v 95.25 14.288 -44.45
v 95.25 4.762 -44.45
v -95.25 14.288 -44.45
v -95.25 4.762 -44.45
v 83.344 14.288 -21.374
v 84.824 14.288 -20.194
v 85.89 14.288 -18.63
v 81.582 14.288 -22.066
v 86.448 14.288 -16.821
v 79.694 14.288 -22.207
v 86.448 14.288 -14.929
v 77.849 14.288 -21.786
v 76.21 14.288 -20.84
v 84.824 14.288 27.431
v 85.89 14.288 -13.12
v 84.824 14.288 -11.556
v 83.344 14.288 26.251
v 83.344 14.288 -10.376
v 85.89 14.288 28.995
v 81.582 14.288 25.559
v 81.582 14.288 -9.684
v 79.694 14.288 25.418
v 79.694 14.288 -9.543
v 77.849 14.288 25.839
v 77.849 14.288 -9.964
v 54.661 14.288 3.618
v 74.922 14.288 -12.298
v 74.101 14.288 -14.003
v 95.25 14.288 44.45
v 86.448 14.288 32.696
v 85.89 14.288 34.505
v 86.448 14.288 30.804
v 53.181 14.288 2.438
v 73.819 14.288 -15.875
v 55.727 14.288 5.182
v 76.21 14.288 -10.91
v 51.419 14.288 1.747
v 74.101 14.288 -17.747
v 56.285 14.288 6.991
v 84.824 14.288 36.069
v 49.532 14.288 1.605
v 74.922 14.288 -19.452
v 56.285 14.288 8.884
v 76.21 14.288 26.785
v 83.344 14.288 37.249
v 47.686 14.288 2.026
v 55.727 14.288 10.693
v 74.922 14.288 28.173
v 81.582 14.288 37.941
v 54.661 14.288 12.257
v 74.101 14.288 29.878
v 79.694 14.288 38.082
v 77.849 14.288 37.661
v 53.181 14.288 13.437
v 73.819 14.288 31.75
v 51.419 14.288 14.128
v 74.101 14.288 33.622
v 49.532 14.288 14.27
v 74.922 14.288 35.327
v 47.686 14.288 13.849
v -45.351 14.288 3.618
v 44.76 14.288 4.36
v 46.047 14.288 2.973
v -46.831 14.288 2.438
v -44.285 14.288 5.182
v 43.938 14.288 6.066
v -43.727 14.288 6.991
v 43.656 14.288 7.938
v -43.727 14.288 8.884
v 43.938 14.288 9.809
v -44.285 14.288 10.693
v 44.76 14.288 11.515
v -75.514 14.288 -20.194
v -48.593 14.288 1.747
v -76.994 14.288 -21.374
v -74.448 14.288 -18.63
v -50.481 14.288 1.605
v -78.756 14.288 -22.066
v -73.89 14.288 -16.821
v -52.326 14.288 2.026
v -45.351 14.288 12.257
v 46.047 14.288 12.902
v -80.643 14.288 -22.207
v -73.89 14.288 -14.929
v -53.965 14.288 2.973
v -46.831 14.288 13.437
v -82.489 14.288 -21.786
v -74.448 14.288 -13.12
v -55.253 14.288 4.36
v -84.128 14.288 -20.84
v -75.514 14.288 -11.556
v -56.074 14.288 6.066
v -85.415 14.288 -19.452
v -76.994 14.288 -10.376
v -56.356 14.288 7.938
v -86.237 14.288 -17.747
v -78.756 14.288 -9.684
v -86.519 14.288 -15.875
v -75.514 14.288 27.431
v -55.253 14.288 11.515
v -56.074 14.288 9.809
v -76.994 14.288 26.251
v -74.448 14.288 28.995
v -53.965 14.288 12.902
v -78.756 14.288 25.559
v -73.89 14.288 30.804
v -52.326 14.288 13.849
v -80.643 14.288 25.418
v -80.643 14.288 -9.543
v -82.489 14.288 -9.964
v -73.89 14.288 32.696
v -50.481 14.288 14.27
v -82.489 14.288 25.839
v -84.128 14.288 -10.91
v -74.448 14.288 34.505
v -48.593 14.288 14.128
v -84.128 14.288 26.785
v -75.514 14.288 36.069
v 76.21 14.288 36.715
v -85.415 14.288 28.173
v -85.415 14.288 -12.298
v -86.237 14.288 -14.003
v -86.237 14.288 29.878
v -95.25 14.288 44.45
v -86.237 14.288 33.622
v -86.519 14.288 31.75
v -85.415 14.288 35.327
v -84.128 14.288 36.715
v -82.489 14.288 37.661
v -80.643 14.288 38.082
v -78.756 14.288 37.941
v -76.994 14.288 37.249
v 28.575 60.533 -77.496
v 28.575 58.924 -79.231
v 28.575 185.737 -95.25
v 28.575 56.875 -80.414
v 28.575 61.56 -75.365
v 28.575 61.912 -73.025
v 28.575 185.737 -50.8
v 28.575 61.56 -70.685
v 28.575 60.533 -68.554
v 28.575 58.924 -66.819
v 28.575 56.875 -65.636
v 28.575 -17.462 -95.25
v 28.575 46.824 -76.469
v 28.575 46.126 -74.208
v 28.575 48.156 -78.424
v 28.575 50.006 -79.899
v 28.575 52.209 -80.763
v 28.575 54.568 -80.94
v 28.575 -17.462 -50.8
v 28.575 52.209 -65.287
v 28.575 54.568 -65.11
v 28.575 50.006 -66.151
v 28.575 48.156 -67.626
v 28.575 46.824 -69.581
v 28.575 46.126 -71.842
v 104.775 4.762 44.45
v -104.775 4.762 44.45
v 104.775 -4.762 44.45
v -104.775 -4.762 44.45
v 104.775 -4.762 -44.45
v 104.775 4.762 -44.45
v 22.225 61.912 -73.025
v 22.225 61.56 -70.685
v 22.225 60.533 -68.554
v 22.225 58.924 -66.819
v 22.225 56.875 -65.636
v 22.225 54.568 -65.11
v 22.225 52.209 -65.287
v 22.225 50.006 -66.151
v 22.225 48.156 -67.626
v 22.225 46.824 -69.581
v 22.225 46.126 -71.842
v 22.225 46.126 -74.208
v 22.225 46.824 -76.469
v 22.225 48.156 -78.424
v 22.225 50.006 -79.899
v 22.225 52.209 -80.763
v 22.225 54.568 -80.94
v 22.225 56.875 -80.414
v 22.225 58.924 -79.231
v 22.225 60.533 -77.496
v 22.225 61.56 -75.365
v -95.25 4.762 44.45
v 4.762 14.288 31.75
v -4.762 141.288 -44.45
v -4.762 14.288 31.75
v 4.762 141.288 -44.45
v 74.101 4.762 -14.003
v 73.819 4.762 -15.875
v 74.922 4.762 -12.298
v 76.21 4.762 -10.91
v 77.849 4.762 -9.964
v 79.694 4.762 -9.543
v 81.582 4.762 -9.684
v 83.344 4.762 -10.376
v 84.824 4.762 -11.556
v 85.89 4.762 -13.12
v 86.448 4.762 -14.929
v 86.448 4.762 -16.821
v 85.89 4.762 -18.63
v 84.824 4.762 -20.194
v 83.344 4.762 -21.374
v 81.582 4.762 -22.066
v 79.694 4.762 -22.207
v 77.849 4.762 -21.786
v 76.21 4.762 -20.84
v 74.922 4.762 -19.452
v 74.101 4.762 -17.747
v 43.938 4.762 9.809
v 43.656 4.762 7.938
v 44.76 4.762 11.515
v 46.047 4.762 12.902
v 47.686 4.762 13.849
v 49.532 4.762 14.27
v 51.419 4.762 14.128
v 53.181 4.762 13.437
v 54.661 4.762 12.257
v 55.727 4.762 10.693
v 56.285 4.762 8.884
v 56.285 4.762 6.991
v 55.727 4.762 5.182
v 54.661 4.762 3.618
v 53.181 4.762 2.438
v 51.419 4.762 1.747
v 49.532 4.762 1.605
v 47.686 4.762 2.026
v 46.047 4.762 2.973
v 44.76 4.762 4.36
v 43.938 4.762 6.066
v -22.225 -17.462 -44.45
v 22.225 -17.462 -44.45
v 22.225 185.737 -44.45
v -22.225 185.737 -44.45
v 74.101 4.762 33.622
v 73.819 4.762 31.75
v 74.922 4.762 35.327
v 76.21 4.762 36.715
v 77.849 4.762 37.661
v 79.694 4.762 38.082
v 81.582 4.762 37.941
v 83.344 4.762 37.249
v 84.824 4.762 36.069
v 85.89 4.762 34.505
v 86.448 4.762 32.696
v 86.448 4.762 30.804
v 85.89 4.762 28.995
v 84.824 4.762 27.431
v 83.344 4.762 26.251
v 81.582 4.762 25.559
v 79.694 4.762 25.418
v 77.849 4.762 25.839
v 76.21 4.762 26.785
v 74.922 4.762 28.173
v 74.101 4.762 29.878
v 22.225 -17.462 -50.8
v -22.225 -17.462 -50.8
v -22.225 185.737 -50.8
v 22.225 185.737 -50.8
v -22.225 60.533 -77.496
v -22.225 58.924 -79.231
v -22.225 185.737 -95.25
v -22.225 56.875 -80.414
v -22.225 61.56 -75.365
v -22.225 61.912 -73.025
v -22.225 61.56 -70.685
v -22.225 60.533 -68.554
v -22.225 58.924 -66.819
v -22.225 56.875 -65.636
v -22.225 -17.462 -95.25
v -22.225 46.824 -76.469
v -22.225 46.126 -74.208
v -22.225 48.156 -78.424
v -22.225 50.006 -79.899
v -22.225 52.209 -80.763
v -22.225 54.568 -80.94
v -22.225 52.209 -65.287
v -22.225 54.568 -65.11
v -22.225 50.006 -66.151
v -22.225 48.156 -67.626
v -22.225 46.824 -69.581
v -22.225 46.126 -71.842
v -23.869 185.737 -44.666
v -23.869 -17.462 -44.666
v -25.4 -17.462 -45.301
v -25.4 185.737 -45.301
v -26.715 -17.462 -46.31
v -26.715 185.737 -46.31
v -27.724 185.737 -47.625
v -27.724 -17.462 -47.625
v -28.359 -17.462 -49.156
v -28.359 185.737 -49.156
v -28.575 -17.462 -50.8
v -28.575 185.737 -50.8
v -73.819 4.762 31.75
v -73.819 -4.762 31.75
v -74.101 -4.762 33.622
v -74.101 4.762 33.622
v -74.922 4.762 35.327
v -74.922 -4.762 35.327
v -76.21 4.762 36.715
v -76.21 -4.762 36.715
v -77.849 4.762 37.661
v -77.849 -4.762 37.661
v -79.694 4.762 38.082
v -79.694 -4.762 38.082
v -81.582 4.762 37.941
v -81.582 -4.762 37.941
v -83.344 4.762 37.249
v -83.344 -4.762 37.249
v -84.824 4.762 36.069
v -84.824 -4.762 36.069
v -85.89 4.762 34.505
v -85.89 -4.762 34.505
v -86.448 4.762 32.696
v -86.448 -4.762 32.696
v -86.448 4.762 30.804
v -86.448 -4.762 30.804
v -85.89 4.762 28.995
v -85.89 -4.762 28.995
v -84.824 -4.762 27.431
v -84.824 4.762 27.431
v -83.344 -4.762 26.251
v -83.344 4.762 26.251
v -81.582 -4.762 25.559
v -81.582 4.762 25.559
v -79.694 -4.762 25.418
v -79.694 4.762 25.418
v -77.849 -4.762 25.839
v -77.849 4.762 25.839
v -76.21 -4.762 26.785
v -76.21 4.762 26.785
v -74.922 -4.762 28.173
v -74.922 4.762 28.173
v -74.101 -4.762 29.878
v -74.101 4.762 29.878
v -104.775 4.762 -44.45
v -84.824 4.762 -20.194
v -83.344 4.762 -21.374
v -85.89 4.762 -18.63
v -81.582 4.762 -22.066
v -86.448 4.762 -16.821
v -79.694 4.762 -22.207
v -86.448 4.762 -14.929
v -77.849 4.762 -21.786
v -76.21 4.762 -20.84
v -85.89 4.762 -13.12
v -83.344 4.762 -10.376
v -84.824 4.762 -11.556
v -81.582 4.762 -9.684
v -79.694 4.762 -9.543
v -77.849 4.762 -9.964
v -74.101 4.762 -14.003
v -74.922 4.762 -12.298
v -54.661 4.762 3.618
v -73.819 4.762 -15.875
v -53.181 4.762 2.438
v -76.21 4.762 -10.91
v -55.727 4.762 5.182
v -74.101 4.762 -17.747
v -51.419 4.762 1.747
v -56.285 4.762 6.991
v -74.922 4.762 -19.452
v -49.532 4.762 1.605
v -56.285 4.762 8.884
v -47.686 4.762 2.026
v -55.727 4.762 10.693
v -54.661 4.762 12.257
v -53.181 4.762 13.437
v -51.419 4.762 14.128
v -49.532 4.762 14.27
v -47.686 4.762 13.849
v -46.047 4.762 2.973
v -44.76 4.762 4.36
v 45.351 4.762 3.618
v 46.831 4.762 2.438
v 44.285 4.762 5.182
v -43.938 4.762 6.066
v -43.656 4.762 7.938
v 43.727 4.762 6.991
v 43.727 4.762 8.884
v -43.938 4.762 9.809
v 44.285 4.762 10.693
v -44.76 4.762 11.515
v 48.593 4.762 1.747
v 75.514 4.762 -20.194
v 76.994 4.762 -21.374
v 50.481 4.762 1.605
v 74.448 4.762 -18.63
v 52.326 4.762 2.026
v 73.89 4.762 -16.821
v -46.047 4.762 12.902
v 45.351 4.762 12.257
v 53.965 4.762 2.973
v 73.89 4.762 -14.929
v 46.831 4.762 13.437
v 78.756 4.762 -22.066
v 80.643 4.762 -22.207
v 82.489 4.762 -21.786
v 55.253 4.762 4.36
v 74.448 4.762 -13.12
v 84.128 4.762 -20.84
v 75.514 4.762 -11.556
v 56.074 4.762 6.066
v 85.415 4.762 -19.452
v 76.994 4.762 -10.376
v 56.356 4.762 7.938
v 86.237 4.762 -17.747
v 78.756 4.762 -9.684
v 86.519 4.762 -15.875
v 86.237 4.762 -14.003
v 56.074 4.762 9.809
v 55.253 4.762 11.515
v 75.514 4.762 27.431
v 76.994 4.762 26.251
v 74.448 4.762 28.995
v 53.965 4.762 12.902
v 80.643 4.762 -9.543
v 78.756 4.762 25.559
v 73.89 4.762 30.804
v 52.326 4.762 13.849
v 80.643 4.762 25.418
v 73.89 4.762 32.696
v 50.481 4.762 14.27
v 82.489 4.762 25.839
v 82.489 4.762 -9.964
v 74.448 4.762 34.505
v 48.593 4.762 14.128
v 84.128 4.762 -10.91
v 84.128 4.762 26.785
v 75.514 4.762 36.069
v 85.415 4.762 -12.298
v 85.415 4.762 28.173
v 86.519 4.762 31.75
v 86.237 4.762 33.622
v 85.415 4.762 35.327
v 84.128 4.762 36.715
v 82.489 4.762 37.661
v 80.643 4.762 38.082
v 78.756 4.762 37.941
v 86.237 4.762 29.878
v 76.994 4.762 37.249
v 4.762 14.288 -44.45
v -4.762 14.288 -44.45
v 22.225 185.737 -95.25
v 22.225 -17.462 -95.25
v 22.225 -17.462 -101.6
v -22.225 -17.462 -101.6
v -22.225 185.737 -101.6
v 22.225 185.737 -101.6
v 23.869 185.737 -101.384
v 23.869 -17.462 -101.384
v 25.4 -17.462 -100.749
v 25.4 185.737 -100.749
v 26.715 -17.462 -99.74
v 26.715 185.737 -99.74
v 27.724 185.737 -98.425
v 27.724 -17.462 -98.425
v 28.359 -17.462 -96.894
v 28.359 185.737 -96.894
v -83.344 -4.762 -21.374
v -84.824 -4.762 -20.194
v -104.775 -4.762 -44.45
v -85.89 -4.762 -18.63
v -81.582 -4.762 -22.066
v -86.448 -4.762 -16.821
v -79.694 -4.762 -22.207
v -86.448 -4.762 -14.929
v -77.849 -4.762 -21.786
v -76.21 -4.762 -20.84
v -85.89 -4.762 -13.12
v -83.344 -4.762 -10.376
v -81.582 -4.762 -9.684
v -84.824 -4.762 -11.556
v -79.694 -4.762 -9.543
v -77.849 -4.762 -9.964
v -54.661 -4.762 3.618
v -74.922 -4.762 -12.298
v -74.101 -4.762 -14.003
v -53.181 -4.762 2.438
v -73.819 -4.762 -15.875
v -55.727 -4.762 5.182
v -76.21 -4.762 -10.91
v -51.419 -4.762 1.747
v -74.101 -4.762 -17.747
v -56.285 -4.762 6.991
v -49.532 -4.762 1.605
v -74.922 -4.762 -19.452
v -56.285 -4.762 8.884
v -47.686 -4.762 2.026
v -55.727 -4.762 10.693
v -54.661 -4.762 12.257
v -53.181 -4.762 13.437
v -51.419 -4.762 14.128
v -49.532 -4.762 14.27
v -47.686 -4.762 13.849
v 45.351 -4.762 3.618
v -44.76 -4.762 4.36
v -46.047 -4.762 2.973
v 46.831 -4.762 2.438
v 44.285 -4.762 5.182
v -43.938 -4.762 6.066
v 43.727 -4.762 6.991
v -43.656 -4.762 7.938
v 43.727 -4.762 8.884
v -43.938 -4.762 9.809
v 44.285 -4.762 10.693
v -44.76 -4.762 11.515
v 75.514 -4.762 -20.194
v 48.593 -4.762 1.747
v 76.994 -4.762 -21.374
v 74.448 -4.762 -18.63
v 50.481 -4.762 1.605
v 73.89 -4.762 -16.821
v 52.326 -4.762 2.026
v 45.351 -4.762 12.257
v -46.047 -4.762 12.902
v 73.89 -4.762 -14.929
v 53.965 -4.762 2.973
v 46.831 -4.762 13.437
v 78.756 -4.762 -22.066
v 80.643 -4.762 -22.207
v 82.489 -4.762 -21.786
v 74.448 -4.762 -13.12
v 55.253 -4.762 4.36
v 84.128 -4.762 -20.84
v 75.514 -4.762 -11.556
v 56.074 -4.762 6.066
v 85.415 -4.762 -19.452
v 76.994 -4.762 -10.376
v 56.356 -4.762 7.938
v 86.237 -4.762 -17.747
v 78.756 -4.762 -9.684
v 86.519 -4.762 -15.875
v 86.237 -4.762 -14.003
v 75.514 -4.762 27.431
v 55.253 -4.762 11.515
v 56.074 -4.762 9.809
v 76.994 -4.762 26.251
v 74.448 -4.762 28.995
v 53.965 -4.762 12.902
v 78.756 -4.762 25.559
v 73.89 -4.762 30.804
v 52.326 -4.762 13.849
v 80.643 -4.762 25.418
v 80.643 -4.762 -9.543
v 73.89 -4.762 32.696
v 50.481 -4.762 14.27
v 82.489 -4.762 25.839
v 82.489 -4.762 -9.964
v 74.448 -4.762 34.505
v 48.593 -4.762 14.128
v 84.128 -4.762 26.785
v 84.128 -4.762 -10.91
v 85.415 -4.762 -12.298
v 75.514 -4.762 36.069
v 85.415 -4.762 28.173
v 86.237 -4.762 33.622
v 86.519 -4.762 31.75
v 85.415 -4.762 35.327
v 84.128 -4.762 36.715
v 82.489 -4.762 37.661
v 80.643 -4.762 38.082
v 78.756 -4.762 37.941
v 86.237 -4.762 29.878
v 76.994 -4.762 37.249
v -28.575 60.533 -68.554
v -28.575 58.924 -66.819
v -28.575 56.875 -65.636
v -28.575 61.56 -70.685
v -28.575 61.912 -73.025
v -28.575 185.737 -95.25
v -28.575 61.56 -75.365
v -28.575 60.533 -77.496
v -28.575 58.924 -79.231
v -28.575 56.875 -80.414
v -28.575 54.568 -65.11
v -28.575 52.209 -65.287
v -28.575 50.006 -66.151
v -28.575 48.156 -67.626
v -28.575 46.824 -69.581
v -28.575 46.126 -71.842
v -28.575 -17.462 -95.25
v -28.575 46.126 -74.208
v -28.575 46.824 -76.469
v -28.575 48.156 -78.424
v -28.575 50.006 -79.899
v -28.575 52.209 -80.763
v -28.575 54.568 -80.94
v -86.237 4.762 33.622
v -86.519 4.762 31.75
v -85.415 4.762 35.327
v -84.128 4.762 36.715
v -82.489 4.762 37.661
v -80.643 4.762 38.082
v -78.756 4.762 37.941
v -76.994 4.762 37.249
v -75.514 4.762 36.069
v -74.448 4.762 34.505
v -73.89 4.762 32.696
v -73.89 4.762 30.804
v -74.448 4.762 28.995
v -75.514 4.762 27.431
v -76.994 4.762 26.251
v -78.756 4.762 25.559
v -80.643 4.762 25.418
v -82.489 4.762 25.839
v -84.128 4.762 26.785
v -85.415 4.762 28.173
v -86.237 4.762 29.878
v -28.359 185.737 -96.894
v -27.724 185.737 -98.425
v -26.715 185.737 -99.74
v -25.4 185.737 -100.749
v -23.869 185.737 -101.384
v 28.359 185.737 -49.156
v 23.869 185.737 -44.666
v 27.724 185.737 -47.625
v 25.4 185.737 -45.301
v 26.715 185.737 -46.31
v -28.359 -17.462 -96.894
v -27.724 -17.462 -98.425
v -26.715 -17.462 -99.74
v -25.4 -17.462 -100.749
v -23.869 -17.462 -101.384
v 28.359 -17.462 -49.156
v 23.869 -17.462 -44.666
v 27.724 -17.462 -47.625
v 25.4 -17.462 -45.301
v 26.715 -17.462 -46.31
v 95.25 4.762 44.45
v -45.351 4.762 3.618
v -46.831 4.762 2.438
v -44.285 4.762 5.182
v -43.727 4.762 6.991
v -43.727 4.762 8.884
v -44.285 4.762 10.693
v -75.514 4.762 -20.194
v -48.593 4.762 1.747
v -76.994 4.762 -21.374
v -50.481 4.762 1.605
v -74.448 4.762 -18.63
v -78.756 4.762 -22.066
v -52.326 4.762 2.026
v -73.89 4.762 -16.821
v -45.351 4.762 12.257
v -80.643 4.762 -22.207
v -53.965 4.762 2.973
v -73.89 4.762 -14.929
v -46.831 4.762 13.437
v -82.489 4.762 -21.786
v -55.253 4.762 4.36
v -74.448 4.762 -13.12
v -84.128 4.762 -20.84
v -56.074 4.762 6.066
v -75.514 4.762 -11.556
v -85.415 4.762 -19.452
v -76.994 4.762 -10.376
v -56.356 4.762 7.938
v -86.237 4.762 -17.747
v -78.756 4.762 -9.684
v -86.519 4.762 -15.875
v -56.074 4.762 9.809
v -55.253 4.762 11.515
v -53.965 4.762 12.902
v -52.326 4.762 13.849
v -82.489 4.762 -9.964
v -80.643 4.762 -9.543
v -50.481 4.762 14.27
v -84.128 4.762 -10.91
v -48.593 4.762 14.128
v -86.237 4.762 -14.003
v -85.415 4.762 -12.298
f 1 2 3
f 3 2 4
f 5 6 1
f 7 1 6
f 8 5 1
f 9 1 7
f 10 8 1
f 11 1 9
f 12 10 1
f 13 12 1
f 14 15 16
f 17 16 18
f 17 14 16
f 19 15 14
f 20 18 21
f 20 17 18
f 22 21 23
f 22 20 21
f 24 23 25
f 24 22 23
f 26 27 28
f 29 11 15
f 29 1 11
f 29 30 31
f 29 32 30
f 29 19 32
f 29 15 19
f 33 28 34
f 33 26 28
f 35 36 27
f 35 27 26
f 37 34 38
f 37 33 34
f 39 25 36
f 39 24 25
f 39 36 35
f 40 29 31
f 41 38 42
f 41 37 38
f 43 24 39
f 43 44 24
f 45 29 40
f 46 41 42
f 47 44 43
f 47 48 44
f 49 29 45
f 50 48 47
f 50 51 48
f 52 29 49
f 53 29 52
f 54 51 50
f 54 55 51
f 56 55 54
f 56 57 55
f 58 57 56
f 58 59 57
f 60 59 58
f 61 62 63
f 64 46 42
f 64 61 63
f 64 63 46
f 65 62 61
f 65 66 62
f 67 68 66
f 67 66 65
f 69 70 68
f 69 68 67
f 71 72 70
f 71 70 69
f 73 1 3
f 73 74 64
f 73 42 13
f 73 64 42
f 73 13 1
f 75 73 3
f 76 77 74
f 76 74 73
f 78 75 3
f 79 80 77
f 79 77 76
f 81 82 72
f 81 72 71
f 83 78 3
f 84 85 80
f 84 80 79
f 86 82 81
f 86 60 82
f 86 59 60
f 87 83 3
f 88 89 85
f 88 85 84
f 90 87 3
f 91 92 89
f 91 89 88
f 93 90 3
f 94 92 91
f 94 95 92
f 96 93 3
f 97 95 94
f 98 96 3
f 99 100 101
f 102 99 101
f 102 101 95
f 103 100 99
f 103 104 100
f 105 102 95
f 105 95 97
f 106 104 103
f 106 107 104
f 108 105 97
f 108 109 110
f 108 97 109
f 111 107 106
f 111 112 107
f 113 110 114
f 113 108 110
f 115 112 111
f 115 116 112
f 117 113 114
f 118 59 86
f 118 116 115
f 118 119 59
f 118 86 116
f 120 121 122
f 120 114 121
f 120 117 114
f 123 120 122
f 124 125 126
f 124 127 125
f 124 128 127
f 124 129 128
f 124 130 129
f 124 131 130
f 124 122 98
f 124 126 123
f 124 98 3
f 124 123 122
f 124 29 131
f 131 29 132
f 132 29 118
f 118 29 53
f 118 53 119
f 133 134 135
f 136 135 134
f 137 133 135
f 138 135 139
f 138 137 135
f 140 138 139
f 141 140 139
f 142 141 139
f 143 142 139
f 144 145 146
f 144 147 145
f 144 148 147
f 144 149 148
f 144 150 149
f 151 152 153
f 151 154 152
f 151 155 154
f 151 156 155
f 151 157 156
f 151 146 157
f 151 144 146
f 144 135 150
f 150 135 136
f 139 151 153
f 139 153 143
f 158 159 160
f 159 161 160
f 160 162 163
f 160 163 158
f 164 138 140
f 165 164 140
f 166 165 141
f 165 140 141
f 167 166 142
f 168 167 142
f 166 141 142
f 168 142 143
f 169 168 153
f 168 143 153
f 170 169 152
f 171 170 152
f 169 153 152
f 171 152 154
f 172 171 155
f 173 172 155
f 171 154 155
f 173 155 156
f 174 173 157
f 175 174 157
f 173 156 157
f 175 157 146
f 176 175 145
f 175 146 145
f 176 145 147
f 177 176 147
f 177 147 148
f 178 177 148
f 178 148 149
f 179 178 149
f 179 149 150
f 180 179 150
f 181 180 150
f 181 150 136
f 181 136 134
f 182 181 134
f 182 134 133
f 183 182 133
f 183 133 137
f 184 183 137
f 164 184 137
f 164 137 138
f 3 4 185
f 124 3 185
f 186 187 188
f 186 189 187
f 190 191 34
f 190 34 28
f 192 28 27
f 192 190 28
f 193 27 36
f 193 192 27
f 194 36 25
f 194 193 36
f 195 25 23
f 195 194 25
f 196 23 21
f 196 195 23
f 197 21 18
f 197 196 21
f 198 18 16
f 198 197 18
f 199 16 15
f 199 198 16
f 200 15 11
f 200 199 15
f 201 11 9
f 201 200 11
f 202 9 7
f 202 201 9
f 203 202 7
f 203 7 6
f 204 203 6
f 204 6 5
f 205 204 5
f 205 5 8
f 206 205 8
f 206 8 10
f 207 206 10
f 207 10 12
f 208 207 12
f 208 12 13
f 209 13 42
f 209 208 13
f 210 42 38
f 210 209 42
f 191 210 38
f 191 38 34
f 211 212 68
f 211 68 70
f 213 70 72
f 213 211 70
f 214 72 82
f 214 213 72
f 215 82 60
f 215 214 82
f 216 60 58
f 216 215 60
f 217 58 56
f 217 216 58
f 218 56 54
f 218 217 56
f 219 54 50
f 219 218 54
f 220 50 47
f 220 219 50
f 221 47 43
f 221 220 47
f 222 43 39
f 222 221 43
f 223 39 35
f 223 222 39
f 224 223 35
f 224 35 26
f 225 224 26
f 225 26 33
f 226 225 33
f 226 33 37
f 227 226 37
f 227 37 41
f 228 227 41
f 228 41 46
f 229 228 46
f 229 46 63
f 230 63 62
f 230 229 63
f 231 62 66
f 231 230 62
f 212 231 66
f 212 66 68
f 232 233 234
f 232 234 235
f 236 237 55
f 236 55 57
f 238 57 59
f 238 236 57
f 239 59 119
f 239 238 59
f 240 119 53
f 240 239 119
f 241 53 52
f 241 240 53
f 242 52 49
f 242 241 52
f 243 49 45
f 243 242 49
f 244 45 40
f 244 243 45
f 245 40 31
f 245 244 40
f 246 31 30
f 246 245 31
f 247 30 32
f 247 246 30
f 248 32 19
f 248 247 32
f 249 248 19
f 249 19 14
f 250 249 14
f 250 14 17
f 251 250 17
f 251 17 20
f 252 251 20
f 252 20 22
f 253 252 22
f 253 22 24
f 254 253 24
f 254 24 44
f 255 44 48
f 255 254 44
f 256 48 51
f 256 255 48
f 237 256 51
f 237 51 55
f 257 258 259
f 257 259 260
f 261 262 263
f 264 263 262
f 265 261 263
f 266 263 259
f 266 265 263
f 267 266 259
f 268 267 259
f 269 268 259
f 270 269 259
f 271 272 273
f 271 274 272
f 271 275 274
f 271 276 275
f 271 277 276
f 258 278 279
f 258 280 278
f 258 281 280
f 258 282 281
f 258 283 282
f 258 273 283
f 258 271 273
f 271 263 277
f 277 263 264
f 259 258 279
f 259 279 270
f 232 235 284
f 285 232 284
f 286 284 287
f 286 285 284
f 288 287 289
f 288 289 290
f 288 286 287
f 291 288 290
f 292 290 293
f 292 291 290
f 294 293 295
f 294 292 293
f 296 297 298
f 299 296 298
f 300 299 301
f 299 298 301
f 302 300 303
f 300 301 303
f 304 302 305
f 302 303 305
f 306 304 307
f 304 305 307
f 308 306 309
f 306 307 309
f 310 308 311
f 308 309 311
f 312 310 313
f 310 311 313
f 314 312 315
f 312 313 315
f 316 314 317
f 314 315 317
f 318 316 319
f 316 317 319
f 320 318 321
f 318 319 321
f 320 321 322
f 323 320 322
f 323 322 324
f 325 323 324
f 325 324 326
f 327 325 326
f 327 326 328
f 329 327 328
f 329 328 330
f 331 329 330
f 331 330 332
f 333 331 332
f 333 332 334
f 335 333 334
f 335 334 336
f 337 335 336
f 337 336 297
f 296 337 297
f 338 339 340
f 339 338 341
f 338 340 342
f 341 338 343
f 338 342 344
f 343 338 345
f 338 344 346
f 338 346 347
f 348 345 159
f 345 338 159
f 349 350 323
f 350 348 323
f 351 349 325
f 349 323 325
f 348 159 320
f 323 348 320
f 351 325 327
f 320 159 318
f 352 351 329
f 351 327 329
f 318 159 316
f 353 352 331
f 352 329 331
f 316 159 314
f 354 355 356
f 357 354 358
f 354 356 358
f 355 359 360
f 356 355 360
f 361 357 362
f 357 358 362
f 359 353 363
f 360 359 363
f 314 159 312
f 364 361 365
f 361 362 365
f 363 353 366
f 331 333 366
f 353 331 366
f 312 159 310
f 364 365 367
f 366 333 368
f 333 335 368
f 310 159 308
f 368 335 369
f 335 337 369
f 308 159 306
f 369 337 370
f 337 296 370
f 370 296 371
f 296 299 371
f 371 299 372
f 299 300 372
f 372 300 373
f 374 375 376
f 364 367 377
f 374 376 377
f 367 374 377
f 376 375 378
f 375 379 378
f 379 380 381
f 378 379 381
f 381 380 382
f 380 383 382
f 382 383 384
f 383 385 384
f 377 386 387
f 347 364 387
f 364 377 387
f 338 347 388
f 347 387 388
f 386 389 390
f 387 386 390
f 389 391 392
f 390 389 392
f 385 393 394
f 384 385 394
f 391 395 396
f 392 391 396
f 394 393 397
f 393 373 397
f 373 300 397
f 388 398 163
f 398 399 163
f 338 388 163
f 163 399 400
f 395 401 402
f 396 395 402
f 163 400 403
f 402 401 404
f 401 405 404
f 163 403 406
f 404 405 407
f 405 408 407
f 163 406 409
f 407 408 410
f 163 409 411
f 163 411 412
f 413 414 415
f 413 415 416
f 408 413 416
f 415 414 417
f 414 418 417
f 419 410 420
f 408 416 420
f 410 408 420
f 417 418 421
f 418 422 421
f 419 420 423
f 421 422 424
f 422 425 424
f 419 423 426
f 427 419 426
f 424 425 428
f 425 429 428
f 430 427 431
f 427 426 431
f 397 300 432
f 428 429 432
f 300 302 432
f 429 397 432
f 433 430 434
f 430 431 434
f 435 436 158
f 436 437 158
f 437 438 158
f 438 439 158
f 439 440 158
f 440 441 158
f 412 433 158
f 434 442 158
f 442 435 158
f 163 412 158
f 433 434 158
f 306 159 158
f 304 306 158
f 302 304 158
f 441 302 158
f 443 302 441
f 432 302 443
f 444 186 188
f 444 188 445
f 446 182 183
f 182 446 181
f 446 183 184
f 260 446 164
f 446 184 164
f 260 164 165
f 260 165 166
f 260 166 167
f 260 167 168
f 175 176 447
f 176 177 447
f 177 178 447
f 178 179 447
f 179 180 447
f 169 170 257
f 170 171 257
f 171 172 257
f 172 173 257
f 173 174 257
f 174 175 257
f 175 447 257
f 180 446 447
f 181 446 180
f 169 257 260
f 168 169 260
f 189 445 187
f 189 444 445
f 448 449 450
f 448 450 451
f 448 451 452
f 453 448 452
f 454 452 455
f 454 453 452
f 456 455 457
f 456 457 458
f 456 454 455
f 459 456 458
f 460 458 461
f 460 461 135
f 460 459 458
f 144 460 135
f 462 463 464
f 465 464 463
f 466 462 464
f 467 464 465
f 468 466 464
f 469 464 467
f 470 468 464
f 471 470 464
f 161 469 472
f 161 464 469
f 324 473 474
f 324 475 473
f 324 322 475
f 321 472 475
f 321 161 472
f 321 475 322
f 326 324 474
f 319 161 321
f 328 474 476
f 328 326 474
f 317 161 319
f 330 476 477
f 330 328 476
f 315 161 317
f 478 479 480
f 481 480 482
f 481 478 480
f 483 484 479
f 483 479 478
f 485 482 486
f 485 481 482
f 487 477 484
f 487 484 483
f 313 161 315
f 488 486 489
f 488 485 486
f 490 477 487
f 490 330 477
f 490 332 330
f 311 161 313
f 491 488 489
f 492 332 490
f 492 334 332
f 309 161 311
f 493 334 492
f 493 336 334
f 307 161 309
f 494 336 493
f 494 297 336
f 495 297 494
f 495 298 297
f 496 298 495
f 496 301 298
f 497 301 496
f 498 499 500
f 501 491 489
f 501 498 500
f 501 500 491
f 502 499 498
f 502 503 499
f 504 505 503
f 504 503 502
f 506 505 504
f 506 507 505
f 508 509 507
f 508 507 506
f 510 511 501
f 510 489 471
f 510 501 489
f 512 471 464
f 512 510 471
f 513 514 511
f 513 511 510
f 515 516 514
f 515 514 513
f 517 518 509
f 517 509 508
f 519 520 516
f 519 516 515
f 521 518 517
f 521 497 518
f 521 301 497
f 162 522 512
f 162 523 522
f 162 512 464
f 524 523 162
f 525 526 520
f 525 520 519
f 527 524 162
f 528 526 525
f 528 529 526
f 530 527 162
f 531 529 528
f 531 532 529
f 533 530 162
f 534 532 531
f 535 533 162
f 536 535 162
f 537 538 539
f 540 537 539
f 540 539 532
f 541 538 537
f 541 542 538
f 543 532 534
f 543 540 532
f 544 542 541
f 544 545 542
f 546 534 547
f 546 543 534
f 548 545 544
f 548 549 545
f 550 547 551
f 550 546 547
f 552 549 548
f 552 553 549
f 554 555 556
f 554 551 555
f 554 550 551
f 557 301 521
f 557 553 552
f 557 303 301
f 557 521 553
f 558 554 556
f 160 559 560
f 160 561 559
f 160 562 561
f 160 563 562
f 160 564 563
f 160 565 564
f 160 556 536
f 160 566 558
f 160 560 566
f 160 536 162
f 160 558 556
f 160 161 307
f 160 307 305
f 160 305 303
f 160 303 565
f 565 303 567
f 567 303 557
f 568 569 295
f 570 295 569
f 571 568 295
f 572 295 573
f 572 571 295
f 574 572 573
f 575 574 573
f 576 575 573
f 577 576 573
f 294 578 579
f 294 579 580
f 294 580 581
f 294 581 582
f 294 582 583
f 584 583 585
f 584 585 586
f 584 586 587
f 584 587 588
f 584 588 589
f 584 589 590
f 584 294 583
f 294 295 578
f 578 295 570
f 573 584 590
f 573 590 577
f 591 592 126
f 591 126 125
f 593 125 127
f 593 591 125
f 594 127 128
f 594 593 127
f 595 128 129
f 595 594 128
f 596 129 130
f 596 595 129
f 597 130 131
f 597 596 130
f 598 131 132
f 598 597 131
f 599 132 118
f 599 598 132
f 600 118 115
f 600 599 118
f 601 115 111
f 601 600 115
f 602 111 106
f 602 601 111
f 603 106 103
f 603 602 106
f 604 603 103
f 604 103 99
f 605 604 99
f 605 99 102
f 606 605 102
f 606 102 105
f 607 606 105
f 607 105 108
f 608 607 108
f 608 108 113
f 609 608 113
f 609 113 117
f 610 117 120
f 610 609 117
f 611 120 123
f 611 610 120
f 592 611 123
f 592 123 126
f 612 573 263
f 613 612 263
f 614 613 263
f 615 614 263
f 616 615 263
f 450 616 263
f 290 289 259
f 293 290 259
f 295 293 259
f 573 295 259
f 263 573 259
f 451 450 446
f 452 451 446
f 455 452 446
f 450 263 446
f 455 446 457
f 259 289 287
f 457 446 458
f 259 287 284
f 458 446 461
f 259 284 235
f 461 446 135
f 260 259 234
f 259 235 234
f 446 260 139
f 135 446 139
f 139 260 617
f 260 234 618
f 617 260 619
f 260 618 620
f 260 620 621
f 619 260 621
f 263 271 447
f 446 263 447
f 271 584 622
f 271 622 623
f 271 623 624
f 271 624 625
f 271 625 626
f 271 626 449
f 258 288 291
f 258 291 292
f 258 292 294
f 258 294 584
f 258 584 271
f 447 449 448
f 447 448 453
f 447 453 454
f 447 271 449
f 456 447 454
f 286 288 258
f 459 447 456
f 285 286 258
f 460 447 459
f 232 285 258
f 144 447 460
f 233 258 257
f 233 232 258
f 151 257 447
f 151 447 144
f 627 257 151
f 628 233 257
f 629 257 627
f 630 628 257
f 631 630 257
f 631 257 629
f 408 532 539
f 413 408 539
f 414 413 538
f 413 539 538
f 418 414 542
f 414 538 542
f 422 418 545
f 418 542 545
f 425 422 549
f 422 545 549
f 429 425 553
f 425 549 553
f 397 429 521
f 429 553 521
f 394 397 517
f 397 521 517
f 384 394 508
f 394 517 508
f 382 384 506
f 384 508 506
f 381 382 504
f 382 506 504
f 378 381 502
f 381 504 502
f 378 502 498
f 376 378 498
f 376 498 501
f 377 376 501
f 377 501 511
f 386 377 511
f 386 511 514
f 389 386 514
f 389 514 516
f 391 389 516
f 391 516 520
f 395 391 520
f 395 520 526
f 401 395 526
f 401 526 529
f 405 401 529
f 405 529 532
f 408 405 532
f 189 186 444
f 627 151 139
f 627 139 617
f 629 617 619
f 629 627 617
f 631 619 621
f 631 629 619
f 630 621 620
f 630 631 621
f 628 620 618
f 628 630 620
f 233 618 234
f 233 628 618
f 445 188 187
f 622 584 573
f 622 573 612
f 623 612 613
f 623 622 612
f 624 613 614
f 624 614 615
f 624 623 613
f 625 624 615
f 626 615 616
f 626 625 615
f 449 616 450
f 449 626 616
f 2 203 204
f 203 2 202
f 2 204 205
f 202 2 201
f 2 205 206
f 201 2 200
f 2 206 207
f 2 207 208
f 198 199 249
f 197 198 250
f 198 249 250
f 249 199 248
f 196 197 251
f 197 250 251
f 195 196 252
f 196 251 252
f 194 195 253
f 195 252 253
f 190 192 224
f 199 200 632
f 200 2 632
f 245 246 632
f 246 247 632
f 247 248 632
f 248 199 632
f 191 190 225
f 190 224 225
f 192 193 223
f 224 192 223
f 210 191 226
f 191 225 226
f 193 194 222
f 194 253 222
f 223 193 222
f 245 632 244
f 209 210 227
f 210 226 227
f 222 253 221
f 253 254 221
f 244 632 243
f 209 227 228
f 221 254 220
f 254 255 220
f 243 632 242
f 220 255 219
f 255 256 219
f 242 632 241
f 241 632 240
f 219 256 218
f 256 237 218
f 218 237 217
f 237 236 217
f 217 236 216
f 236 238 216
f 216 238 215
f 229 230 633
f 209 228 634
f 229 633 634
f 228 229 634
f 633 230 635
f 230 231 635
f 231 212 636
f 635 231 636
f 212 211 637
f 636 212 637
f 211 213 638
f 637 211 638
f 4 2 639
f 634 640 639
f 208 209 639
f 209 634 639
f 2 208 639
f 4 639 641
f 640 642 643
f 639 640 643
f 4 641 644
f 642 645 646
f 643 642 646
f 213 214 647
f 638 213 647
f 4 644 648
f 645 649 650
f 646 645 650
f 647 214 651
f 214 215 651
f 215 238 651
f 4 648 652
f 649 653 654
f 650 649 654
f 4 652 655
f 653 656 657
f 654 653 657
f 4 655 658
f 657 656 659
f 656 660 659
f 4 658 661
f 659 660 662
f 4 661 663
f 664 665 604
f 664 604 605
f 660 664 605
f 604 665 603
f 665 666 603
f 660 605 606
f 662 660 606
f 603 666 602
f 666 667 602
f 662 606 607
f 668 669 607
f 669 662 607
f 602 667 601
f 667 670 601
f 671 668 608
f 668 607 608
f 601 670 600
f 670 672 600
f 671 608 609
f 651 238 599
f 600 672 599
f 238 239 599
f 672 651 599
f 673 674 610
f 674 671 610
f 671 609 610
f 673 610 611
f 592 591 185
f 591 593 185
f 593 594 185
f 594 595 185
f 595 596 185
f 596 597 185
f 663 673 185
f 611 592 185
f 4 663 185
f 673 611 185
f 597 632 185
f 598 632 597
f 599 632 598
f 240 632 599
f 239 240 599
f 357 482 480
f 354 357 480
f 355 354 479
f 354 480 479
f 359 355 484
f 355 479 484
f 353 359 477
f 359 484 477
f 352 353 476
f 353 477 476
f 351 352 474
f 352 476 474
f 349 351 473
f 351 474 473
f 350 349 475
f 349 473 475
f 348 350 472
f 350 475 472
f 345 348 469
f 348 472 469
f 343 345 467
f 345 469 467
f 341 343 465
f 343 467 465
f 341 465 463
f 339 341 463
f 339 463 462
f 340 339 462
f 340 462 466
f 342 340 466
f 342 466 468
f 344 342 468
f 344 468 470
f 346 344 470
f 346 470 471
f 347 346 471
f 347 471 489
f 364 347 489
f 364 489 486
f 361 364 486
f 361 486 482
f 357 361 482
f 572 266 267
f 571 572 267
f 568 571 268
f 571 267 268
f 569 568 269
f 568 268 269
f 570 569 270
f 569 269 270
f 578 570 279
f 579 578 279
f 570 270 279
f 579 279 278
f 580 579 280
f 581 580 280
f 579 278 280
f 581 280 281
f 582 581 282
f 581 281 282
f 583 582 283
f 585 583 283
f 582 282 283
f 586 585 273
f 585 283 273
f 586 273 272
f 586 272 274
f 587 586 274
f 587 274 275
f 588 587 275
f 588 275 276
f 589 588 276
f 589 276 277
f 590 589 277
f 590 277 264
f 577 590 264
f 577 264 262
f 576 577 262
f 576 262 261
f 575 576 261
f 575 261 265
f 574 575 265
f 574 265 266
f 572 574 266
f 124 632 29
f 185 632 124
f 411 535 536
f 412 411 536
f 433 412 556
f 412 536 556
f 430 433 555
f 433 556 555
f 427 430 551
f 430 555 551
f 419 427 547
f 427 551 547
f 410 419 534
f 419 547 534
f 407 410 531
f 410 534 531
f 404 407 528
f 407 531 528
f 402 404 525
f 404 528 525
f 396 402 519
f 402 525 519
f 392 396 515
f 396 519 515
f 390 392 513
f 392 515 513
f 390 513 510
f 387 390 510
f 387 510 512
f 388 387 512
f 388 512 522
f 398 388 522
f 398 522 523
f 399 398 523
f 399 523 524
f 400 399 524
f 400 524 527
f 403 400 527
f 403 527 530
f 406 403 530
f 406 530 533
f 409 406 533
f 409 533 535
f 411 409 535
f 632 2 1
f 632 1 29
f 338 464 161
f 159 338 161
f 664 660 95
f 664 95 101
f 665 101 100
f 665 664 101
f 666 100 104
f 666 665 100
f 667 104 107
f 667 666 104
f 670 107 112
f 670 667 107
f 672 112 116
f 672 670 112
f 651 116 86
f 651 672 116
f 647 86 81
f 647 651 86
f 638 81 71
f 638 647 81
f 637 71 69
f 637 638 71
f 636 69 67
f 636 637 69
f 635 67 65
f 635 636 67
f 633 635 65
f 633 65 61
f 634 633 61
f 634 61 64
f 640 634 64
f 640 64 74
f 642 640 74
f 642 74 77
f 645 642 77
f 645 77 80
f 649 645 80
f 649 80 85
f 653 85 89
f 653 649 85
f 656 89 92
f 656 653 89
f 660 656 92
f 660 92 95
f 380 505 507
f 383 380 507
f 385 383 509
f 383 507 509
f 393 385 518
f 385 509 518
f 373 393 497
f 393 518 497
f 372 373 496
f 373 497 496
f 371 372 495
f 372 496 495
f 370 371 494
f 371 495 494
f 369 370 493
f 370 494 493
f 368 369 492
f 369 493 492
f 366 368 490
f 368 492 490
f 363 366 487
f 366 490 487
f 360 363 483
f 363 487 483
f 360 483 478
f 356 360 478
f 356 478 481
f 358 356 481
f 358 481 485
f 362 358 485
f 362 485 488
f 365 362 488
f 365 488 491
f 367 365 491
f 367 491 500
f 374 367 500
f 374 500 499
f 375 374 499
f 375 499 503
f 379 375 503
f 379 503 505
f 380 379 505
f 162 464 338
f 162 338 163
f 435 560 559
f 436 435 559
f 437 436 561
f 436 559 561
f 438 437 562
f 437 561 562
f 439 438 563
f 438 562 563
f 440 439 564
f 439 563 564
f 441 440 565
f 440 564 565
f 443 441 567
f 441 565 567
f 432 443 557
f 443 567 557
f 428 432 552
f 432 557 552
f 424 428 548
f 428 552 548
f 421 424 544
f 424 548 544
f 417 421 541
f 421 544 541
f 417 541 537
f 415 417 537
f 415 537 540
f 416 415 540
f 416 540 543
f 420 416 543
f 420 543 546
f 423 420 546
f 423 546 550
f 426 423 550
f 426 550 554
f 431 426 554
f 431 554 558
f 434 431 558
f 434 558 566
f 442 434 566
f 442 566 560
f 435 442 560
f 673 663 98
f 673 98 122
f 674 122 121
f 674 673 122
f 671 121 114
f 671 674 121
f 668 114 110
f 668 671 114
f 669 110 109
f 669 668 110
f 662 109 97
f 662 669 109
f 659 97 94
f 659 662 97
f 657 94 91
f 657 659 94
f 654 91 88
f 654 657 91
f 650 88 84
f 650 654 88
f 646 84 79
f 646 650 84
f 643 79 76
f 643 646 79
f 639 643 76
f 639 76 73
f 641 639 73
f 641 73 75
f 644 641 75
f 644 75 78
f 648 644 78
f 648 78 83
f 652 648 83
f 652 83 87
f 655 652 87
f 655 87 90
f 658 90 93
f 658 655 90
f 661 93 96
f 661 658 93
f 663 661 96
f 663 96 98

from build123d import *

# Parameters (mm, degrees)
F0_W      = 209.55
F0_H      = 88.9
F1_DEPTH  = 4.7625
F2_R      = 6.35
F3_DEPTH  = 9.526
F4_W      = 190.5
F4_H      = 88.9
F4_R      = 6.35
F5_DEPTH  = 9.525
F7_W      = 44.45
F7_H      = 44.45
F8_DEPTH  = 203.2
F10_DEPTH = 4.7625
F11_R     = 7.9375
F12_DEPTH = 133.351


with BuildPart() as f1:
    # F0 (on Front) → F1 (new body, symmetric)
    with BuildSketch(Plane.XZ):
        Rectangle(F0_W, F0_H)
    extrude(amount=F1_DEPTH, both=True)

    # F2 (on face) → F3 (cut, through all)
    with BuildSketch(Plane.XZ.offset(4.7625)):
        with Locations((-80.16875, 31.75)):
            Circle(F2_R)
        with Locations((-50.00625, 7.9375)):
            Circle(F2_R)
        with Locations((-80.16875, -15.875)):
            Circle(F2_R)
        with Locations((80.16875, 31.75)):
            Circle(F2_R)
        with Locations((50.00625, 7.9375)):
            Circle(F2_R)
        with Locations((80.16875, -15.875)):
            Circle(F2_R)
    extrude(amount=-F3_DEPTH, mode=Mode.SUBTRACT)


with BuildPart() as f5:
    # F4 (on face) → F5 (new body)
    with BuildSketch(Plane(origin=(0, 4.7625, 0), x_dir=(-1, 0, 0), z_dir=(0, 1, 0))):
        Rectangle(F4_W, F4_H)
        with Locations((-80.16875, -15.875)):
            Circle(F4_R, mode=Mode.SUBTRACT)
        with Locations((80.16875, -15.875)):
            Circle(F4_R, mode=Mode.SUBTRACT)
        with Locations((-50.00625, 7.9375)):
            Circle(F4_R, mode=Mode.SUBTRACT)
        with Locations((-80.16875, 31.75)):
            Circle(F4_R, mode=Mode.SUBTRACT)
        with Locations((50.00625, 7.9375)):
            Circle(F4_R, mode=Mode.SUBTRACT)
        with Locations((80.16875, 31.75)):
            Circle(F4_R, mode=Mode.SUBTRACT)
    extrude(amount=F5_DEPTH)


with BuildPart() as f8:
    # F7 (on offset) → F8 (new body)
    with BuildSketch(Plane.XZ.offset(17.4625)):
        with BuildLine():
            Line((-22.225, -101.6), (22.225, -101.6))
            ThreePointArc((22.225, -101.6), (26.7151280605, -99.7401280605), (28.575, -95.25))
            Line((28.575, -95.25), (28.575, -50.8))
            ThreePointArc((28.575, -50.8), (26.7151280605, -46.3098719395), (22.225, -44.45))
            Line((22.225, -44.45), (-22.225, -44.45))
            ThreePointArc((-22.225, -44.45), (-26.7151280605, -46.3098719395), (-28.575, -50.8))
            Line((-28.575, -50.8), (-28.575, -95.25))
            ThreePointArc((-28.575, -95.25), (-26.7151280605, -99.7401280605), (-22.225, -101.6))
        make_face()
        with Locations((0, -73.025)):
            Rectangle(F7_W, F7_H, mode=Mode.SUBTRACT)
    extrude(amount=-F8_DEPTH)

    # F11 (on face) → F12 (cut, through all)
    with BuildSketch(Plane.YZ.offset(28.575)):
        with Locations((53.975, -73.025)):
            Circle(F11_R)
    extrude(amount=-F12_DEPTH, mode=Mode.SUBTRACT)


with BuildPart() as f10:
    # F9 (on Right) → F10 (new body, symmetric)
    with BuildSketch(Plane.YZ):
        Polygon((141.2875, -44.45), (14.2875, 31.75), (14.2875, -44.45), align=None)
    extrude(amount=F10_DEPTH, both=True)


solid = Compound([f1.part, f5.part, f8.part, f10.part])
